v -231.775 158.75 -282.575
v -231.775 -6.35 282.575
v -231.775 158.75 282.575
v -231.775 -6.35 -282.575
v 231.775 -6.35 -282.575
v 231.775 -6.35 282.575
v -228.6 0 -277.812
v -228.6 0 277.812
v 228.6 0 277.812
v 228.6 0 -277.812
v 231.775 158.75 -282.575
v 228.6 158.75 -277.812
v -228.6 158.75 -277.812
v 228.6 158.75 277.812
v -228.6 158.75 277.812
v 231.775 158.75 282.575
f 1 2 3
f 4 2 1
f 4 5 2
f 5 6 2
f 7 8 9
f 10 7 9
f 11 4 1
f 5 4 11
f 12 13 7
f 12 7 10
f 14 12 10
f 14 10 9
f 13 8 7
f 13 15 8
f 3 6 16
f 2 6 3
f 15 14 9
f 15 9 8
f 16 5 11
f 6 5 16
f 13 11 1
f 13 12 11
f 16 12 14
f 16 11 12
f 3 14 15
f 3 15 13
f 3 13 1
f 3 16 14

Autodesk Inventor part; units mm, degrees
ref_plane "YZ Plane" through (0, 0, 0) normal (1, 0, 0) x (0, 1, 0)
ref_plane "XZ Plane" through (0, 0, 0) normal (0, 1, 0) x (-1, 0, 0)
ref_plane "XY Plane" through (0, 0, 0) normal (0, 0, 1) x (1, 0, 0)
sketch "Sketch1" plane through (0, 0, 0) normal (0, 1, 0) x (-1, 0, 0)
  line L0 (-231.775, 282.575) -> (231.775, 282.575)
  line L1 (231.775, 282.575) -> (231.775, -282.575)
  line L2 (231.775, -282.575) -> (-231.775, -282.575)
  line L3 (-231.775, -282.575) -> (-231.775, 282.575)
  line L4 (-231.775, 282.575) -> (231.775, -282.575) construction
  line L5 (231.775, 282.575) -> (-231.775, -282.575) construction
  point P0 (0, 0)
  dimension "d0" = 565.15
  dimension "d1" = 463.55
extrude "Extrusion1" add sketch "Sketch1" along normal blind 158.75 and the other way blind 6.35
sketch "Sketch2" plane through (0, 158.75, 0) normal (0, 1, 0) x (1, 0, 0)
  line L0 (228.6, -277.8125) -> (-228.6, -277.8125)
  line L1 (-228.6, -277.8125) -> (-228.6, 277.8125)
  line L2 (-228.6, 277.8125) -> (228.6, 277.8125)
  line L3 (228.6, 277.8125) -> (228.6, -277.8125)
  line L4 (228.6, -277.8125) -> (-228.6, 277.8125) construction
  line L5 (-228.6, -277.8125) -> (228.6, 277.8125) construction
  point P0 (0, 0)
  dimension "d4" = 555.625
  dimension "d5" = 457.2
extrude "Extrusion2" cut sketch "Sketch2" against normal blind 158.75
properties part number "Pelican box"
